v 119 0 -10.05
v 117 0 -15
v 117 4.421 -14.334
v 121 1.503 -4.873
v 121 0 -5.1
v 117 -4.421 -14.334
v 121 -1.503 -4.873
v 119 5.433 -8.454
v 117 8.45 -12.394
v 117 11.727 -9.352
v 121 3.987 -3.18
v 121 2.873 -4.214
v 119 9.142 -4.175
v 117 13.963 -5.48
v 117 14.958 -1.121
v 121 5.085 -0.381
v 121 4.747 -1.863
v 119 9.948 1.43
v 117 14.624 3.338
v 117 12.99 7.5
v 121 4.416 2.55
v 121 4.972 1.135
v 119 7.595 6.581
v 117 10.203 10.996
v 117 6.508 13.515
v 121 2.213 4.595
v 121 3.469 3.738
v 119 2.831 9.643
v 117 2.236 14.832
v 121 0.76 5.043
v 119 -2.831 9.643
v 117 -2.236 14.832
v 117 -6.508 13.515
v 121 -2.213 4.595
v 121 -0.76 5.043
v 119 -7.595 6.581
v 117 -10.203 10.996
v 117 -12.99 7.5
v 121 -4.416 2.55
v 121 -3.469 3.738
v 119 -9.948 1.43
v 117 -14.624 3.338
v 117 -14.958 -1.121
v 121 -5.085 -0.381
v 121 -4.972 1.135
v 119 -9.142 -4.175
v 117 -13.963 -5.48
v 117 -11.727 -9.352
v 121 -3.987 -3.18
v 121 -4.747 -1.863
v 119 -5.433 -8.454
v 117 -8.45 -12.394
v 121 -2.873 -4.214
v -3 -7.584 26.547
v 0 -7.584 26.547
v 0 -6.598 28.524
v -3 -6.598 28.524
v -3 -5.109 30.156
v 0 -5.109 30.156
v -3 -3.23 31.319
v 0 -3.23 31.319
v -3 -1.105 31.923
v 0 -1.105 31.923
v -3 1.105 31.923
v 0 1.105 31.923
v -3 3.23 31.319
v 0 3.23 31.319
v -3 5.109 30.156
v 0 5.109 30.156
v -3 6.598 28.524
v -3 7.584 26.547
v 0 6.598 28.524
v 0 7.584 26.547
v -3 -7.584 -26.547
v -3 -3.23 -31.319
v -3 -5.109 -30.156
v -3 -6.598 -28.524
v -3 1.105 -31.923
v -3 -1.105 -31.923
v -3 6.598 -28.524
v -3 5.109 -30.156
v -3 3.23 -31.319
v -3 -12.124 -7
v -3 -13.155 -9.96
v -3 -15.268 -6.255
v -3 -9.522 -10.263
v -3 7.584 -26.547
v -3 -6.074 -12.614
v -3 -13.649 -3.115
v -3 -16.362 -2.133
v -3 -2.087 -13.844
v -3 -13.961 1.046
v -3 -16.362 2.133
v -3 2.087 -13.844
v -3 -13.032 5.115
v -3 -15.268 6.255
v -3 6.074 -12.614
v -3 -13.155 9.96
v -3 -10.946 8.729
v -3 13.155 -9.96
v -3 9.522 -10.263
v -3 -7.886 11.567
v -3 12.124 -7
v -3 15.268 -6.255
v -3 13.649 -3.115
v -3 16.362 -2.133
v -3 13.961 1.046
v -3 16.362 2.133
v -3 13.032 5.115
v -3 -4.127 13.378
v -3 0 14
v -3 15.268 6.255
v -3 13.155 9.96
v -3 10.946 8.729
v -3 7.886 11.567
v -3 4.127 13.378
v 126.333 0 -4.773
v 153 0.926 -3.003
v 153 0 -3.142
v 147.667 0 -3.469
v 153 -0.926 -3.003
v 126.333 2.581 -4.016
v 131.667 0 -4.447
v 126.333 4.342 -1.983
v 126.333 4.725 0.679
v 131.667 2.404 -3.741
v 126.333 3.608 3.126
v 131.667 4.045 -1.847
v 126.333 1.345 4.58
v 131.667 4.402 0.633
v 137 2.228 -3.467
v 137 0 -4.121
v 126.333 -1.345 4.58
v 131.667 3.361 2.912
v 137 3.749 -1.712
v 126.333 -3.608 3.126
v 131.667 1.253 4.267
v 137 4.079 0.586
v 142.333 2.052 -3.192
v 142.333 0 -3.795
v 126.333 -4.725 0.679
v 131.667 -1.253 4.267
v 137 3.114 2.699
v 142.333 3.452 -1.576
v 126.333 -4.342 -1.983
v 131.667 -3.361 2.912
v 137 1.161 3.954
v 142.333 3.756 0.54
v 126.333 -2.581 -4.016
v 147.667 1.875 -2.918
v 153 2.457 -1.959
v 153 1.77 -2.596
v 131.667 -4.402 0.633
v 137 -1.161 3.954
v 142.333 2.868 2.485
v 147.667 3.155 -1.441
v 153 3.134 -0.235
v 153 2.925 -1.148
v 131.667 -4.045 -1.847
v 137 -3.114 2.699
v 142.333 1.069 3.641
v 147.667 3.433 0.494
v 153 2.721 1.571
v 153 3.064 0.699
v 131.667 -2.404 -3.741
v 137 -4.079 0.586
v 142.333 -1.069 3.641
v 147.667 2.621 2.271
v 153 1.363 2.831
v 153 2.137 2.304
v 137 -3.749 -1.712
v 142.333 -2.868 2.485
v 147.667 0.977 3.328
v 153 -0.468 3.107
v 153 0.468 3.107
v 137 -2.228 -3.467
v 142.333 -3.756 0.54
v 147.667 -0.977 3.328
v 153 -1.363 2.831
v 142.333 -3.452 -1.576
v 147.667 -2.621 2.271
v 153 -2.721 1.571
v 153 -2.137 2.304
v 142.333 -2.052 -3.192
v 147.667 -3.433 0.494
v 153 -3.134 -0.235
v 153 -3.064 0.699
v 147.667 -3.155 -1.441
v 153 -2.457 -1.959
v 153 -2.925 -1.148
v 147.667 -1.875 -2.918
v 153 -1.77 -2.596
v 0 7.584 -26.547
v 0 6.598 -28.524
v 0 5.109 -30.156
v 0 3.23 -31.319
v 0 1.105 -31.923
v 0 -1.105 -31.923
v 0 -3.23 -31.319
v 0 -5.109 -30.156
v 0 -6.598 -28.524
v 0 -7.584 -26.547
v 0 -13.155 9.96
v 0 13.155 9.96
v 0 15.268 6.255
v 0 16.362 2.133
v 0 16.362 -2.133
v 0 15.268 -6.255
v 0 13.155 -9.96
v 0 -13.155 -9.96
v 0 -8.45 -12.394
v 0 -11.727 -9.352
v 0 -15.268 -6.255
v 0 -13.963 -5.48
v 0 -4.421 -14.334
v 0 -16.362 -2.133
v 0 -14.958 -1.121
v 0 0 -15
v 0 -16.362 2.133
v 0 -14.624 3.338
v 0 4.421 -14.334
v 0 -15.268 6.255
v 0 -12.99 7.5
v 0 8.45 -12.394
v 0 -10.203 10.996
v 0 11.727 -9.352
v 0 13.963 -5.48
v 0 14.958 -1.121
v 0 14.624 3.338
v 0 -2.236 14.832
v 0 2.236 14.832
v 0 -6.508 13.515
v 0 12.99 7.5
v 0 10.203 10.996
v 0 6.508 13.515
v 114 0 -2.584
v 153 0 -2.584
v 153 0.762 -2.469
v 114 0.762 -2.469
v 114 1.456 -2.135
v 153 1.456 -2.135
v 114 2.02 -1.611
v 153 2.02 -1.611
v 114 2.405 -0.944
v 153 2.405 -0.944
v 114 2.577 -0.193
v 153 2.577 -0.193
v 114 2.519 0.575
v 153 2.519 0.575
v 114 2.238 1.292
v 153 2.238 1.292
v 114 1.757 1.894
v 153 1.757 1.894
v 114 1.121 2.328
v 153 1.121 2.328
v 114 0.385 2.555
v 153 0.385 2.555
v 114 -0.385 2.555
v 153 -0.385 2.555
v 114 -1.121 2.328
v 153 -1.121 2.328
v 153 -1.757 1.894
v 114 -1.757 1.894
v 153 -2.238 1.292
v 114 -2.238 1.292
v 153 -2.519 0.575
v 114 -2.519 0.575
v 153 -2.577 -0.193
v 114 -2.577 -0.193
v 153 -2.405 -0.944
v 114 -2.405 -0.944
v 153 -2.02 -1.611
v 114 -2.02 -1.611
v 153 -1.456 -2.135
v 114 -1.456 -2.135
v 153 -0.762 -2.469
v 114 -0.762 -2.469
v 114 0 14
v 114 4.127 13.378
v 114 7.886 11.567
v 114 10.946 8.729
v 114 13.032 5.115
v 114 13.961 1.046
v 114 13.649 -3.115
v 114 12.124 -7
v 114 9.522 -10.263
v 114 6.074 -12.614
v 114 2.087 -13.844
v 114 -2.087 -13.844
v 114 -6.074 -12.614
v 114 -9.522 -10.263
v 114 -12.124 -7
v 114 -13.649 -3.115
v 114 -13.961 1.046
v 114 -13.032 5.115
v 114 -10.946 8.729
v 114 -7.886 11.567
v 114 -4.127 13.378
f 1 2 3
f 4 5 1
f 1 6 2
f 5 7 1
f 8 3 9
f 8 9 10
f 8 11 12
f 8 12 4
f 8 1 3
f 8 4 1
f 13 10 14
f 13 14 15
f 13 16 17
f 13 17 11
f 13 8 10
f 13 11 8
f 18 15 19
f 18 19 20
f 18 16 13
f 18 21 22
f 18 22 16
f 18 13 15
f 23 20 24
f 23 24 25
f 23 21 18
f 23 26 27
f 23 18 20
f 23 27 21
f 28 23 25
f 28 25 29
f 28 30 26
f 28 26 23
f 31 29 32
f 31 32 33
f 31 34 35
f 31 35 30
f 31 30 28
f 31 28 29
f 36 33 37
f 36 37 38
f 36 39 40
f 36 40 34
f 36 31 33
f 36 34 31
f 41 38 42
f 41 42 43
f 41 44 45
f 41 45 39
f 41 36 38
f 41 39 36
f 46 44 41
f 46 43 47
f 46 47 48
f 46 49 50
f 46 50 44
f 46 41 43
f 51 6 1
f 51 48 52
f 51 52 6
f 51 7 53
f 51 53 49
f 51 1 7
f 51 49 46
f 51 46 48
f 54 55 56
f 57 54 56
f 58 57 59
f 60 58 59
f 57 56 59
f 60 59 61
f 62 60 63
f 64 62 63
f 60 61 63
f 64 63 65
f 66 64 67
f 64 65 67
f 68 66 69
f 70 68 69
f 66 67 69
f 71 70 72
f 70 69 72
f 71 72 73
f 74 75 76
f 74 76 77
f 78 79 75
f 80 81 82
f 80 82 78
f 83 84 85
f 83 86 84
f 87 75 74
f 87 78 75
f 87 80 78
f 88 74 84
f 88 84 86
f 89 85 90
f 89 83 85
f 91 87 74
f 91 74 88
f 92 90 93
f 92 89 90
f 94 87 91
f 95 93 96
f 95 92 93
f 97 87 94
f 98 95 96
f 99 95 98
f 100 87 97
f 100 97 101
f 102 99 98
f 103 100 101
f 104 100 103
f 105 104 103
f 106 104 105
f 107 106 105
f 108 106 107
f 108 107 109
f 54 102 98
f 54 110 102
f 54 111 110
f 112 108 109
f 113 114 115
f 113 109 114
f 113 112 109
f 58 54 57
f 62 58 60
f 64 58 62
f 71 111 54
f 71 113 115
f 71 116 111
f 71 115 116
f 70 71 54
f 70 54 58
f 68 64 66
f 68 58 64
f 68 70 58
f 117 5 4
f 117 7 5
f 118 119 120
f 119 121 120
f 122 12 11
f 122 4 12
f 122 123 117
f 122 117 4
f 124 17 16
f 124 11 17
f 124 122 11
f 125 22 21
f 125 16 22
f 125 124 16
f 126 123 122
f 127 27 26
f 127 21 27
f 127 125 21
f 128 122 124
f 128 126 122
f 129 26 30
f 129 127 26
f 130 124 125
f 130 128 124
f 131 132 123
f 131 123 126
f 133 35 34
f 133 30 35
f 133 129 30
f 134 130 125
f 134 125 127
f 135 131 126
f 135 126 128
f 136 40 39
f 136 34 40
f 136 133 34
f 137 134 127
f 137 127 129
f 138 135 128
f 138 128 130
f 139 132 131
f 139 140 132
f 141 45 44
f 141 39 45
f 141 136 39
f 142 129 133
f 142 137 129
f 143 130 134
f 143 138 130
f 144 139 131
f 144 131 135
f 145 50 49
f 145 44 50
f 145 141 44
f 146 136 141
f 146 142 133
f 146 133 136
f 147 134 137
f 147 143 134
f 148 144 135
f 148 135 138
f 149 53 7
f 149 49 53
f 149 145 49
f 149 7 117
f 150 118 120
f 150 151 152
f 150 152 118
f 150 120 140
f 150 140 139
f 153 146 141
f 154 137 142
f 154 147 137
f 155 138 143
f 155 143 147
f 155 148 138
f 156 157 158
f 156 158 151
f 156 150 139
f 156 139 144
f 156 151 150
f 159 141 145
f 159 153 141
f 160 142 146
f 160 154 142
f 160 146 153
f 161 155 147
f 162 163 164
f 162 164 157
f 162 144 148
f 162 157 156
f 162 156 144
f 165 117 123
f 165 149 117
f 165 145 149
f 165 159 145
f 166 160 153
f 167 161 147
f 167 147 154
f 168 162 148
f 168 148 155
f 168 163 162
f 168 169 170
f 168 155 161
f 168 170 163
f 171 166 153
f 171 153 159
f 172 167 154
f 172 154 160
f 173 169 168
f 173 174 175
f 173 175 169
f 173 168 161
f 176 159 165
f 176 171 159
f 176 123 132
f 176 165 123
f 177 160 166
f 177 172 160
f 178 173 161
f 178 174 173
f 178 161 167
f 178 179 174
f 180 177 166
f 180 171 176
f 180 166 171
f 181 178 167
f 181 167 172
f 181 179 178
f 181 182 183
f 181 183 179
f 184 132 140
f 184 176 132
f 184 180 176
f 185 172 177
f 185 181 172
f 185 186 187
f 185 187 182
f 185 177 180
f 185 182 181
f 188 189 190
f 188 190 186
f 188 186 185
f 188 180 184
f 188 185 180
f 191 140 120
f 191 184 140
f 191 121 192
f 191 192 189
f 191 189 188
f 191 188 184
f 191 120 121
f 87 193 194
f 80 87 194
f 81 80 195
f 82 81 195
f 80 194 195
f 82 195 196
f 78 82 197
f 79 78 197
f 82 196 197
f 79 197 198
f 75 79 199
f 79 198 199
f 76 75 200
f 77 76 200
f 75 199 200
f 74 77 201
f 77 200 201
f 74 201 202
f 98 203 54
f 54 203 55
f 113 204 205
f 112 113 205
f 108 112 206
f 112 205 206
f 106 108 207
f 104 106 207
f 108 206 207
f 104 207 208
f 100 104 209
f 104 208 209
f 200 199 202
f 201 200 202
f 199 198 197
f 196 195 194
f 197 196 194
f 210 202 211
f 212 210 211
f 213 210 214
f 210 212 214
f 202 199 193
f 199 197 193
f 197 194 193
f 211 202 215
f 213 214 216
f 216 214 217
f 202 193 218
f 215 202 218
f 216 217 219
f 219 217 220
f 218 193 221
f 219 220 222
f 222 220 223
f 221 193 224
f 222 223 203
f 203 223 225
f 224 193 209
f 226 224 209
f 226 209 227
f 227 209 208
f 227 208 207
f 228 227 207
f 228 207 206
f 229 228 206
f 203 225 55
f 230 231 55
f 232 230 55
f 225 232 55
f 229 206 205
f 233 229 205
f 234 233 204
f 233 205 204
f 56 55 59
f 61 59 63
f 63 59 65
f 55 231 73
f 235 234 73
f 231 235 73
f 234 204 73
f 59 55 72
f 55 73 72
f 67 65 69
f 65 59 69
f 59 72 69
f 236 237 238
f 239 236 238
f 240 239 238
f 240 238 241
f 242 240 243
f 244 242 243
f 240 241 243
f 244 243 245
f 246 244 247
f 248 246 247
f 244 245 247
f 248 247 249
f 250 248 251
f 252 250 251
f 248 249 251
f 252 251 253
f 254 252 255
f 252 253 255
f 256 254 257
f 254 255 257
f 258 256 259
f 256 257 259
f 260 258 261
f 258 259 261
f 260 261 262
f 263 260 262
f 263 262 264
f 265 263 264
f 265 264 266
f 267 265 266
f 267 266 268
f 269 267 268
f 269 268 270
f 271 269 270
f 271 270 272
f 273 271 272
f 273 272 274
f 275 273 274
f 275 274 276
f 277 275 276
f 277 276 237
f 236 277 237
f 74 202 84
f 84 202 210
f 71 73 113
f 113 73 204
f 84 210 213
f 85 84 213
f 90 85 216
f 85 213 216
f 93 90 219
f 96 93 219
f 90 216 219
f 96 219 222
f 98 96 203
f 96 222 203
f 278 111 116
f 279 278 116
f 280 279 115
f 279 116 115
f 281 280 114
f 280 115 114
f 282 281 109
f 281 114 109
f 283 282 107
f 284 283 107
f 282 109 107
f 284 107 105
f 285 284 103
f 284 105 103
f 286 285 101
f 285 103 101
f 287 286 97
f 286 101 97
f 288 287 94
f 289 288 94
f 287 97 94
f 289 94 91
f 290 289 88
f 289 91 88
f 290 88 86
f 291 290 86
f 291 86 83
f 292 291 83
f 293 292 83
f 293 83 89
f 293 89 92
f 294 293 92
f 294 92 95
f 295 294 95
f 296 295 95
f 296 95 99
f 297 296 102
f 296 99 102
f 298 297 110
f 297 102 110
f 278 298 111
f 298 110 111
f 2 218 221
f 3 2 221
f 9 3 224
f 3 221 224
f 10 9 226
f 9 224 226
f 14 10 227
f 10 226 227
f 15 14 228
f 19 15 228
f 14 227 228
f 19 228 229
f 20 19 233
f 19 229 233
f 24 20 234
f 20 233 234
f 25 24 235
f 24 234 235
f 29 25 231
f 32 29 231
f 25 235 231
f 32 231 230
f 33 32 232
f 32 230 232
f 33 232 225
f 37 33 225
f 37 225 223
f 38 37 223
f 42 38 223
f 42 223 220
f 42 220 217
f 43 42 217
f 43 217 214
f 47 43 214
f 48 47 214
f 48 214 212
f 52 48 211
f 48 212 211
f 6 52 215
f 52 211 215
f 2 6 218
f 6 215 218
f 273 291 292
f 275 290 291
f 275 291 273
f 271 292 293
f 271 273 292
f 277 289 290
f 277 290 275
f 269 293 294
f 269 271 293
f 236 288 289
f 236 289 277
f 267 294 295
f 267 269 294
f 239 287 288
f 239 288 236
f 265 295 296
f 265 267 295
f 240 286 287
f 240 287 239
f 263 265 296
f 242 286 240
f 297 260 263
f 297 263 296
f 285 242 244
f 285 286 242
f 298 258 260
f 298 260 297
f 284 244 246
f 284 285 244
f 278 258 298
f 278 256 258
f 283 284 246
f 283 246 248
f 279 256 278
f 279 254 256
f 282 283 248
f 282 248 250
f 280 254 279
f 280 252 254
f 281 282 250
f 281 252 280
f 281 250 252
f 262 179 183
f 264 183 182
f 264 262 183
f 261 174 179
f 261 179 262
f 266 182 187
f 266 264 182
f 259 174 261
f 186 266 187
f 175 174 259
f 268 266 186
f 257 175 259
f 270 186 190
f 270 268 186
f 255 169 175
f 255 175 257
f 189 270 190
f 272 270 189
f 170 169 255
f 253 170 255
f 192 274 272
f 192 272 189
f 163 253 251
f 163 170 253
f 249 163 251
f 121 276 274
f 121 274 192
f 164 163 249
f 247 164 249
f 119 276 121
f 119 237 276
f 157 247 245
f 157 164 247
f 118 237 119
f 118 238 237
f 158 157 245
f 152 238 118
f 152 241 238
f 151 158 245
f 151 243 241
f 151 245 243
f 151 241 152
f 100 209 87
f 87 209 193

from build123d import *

# Parameters (mm, degrees)
SKETCH1_R           = 15
BOSS_EXTRUDE1_DEPTH = 117
SKETCH2_R           = 15
BOSS_EXTRUDE2_DEPTH = 4
BOSS_EXTRUDE2_TAPER = 68
SKETCH3_R           = 5.099652586
BOSS_EXTRUDE3_DEPTH = 32
BOSS_EXTRUDE3_TAPER = 3.5
BOSS_EXTRUDE4_DEPTH = 3
SKETCH5_R           = 14
CUT_EXTRUDE1_DEPTH  = 117
SKETCH6_R           = 2.583886955
CUT_EXTRUDE2_DEPTH  = 117


with BuildPart() as part:
    # Sketch1 → Boss-Extrude1 (new body)
    with BuildSketch(Plane(origin=(0, 0, 0), x_dir=(0, 0, -1), z_dir=(1, 0, 0))):
        Circle(SKETCH1_R)
    extrude(amount=BOSS_EXTRUDE1_DEPTH)

    # Sketch2 → Boss-Extrude2 (add)
    with BuildSketch(Plane(origin=(117, 0, 0), x_dir=(0, 0, -1), z_dir=(1, 0, 0))):
        Circle(SKETCH2_R)
    extrude(amount=BOSS_EXTRUDE2_DEPTH, taper=BOSS_EXTRUDE2_TAPER)

    # Sketch3 → Boss-Extrude3 (add)
    with BuildSketch(Plane(origin=(121, 0, 0), x_dir=(0, 0, -1), z_dir=(1, 0, 0))):
        Circle(SKETCH3_R)
    extrude(amount=BOSS_EXTRUDE3_DEPTH, taper=BOSS_EXTRUDE3_TAPER)

    # Sketch4 → Boss-Extrude4 (add)
    with BuildSketch(Plane.ZY):
        with BuildLine():
            Line((9.96013089, -13.154739182), (26.54712441, -7.583677026))
            ThreePointArc((26.54712441, -7.583677026), (32, 0), (26.54712441, 7.583677026))
            Line((26.54712441, 7.583677026), (9.96013089, 13.154739182))
            ThreePointArc((9.96013089, 13.154739182), (0, 16.500041524), (-9.96013089, 13.154739182))
            Line((-9.96013089, 13.154739182), (-26.54712441, 7.583677026))
            ThreePointArc((-26.54712441, 7.583677026), (-32, 0), (-26.54712441, -7.583677026))
            Line((-26.54712441, -7.583677026), (-9.96013089, -13.154739182))
            ThreePointArc((-9.96013089, -13.154739182), (0, -16.500041524), (9.96013089, -13.154739182))
        make_face()
    extrude(amount=BOSS_EXTRUDE4_DEPTH)

    # Sketch5 → Cut-Extrude1 (cut)
    with BuildSketch(Plane.ZY.offset(3)):
        Circle(SKETCH5_R)
    extrude(amount=-CUT_EXTRUDE1_DEPTH, mode=Mode.SUBTRACT)

    # Sketch6 → Cut-Extrude2 (cut)
    with BuildSketch(Plane(origin=(153, 0, 0), x_dir=(0, 0, -1), z_dir=(1, 0, 0))):
        Circle(SKETCH6_R)
    extrude(amount=-CUT_EXTRUDE2_DEPTH, mode=Mode.SUBTRACT)


solid = part.part
